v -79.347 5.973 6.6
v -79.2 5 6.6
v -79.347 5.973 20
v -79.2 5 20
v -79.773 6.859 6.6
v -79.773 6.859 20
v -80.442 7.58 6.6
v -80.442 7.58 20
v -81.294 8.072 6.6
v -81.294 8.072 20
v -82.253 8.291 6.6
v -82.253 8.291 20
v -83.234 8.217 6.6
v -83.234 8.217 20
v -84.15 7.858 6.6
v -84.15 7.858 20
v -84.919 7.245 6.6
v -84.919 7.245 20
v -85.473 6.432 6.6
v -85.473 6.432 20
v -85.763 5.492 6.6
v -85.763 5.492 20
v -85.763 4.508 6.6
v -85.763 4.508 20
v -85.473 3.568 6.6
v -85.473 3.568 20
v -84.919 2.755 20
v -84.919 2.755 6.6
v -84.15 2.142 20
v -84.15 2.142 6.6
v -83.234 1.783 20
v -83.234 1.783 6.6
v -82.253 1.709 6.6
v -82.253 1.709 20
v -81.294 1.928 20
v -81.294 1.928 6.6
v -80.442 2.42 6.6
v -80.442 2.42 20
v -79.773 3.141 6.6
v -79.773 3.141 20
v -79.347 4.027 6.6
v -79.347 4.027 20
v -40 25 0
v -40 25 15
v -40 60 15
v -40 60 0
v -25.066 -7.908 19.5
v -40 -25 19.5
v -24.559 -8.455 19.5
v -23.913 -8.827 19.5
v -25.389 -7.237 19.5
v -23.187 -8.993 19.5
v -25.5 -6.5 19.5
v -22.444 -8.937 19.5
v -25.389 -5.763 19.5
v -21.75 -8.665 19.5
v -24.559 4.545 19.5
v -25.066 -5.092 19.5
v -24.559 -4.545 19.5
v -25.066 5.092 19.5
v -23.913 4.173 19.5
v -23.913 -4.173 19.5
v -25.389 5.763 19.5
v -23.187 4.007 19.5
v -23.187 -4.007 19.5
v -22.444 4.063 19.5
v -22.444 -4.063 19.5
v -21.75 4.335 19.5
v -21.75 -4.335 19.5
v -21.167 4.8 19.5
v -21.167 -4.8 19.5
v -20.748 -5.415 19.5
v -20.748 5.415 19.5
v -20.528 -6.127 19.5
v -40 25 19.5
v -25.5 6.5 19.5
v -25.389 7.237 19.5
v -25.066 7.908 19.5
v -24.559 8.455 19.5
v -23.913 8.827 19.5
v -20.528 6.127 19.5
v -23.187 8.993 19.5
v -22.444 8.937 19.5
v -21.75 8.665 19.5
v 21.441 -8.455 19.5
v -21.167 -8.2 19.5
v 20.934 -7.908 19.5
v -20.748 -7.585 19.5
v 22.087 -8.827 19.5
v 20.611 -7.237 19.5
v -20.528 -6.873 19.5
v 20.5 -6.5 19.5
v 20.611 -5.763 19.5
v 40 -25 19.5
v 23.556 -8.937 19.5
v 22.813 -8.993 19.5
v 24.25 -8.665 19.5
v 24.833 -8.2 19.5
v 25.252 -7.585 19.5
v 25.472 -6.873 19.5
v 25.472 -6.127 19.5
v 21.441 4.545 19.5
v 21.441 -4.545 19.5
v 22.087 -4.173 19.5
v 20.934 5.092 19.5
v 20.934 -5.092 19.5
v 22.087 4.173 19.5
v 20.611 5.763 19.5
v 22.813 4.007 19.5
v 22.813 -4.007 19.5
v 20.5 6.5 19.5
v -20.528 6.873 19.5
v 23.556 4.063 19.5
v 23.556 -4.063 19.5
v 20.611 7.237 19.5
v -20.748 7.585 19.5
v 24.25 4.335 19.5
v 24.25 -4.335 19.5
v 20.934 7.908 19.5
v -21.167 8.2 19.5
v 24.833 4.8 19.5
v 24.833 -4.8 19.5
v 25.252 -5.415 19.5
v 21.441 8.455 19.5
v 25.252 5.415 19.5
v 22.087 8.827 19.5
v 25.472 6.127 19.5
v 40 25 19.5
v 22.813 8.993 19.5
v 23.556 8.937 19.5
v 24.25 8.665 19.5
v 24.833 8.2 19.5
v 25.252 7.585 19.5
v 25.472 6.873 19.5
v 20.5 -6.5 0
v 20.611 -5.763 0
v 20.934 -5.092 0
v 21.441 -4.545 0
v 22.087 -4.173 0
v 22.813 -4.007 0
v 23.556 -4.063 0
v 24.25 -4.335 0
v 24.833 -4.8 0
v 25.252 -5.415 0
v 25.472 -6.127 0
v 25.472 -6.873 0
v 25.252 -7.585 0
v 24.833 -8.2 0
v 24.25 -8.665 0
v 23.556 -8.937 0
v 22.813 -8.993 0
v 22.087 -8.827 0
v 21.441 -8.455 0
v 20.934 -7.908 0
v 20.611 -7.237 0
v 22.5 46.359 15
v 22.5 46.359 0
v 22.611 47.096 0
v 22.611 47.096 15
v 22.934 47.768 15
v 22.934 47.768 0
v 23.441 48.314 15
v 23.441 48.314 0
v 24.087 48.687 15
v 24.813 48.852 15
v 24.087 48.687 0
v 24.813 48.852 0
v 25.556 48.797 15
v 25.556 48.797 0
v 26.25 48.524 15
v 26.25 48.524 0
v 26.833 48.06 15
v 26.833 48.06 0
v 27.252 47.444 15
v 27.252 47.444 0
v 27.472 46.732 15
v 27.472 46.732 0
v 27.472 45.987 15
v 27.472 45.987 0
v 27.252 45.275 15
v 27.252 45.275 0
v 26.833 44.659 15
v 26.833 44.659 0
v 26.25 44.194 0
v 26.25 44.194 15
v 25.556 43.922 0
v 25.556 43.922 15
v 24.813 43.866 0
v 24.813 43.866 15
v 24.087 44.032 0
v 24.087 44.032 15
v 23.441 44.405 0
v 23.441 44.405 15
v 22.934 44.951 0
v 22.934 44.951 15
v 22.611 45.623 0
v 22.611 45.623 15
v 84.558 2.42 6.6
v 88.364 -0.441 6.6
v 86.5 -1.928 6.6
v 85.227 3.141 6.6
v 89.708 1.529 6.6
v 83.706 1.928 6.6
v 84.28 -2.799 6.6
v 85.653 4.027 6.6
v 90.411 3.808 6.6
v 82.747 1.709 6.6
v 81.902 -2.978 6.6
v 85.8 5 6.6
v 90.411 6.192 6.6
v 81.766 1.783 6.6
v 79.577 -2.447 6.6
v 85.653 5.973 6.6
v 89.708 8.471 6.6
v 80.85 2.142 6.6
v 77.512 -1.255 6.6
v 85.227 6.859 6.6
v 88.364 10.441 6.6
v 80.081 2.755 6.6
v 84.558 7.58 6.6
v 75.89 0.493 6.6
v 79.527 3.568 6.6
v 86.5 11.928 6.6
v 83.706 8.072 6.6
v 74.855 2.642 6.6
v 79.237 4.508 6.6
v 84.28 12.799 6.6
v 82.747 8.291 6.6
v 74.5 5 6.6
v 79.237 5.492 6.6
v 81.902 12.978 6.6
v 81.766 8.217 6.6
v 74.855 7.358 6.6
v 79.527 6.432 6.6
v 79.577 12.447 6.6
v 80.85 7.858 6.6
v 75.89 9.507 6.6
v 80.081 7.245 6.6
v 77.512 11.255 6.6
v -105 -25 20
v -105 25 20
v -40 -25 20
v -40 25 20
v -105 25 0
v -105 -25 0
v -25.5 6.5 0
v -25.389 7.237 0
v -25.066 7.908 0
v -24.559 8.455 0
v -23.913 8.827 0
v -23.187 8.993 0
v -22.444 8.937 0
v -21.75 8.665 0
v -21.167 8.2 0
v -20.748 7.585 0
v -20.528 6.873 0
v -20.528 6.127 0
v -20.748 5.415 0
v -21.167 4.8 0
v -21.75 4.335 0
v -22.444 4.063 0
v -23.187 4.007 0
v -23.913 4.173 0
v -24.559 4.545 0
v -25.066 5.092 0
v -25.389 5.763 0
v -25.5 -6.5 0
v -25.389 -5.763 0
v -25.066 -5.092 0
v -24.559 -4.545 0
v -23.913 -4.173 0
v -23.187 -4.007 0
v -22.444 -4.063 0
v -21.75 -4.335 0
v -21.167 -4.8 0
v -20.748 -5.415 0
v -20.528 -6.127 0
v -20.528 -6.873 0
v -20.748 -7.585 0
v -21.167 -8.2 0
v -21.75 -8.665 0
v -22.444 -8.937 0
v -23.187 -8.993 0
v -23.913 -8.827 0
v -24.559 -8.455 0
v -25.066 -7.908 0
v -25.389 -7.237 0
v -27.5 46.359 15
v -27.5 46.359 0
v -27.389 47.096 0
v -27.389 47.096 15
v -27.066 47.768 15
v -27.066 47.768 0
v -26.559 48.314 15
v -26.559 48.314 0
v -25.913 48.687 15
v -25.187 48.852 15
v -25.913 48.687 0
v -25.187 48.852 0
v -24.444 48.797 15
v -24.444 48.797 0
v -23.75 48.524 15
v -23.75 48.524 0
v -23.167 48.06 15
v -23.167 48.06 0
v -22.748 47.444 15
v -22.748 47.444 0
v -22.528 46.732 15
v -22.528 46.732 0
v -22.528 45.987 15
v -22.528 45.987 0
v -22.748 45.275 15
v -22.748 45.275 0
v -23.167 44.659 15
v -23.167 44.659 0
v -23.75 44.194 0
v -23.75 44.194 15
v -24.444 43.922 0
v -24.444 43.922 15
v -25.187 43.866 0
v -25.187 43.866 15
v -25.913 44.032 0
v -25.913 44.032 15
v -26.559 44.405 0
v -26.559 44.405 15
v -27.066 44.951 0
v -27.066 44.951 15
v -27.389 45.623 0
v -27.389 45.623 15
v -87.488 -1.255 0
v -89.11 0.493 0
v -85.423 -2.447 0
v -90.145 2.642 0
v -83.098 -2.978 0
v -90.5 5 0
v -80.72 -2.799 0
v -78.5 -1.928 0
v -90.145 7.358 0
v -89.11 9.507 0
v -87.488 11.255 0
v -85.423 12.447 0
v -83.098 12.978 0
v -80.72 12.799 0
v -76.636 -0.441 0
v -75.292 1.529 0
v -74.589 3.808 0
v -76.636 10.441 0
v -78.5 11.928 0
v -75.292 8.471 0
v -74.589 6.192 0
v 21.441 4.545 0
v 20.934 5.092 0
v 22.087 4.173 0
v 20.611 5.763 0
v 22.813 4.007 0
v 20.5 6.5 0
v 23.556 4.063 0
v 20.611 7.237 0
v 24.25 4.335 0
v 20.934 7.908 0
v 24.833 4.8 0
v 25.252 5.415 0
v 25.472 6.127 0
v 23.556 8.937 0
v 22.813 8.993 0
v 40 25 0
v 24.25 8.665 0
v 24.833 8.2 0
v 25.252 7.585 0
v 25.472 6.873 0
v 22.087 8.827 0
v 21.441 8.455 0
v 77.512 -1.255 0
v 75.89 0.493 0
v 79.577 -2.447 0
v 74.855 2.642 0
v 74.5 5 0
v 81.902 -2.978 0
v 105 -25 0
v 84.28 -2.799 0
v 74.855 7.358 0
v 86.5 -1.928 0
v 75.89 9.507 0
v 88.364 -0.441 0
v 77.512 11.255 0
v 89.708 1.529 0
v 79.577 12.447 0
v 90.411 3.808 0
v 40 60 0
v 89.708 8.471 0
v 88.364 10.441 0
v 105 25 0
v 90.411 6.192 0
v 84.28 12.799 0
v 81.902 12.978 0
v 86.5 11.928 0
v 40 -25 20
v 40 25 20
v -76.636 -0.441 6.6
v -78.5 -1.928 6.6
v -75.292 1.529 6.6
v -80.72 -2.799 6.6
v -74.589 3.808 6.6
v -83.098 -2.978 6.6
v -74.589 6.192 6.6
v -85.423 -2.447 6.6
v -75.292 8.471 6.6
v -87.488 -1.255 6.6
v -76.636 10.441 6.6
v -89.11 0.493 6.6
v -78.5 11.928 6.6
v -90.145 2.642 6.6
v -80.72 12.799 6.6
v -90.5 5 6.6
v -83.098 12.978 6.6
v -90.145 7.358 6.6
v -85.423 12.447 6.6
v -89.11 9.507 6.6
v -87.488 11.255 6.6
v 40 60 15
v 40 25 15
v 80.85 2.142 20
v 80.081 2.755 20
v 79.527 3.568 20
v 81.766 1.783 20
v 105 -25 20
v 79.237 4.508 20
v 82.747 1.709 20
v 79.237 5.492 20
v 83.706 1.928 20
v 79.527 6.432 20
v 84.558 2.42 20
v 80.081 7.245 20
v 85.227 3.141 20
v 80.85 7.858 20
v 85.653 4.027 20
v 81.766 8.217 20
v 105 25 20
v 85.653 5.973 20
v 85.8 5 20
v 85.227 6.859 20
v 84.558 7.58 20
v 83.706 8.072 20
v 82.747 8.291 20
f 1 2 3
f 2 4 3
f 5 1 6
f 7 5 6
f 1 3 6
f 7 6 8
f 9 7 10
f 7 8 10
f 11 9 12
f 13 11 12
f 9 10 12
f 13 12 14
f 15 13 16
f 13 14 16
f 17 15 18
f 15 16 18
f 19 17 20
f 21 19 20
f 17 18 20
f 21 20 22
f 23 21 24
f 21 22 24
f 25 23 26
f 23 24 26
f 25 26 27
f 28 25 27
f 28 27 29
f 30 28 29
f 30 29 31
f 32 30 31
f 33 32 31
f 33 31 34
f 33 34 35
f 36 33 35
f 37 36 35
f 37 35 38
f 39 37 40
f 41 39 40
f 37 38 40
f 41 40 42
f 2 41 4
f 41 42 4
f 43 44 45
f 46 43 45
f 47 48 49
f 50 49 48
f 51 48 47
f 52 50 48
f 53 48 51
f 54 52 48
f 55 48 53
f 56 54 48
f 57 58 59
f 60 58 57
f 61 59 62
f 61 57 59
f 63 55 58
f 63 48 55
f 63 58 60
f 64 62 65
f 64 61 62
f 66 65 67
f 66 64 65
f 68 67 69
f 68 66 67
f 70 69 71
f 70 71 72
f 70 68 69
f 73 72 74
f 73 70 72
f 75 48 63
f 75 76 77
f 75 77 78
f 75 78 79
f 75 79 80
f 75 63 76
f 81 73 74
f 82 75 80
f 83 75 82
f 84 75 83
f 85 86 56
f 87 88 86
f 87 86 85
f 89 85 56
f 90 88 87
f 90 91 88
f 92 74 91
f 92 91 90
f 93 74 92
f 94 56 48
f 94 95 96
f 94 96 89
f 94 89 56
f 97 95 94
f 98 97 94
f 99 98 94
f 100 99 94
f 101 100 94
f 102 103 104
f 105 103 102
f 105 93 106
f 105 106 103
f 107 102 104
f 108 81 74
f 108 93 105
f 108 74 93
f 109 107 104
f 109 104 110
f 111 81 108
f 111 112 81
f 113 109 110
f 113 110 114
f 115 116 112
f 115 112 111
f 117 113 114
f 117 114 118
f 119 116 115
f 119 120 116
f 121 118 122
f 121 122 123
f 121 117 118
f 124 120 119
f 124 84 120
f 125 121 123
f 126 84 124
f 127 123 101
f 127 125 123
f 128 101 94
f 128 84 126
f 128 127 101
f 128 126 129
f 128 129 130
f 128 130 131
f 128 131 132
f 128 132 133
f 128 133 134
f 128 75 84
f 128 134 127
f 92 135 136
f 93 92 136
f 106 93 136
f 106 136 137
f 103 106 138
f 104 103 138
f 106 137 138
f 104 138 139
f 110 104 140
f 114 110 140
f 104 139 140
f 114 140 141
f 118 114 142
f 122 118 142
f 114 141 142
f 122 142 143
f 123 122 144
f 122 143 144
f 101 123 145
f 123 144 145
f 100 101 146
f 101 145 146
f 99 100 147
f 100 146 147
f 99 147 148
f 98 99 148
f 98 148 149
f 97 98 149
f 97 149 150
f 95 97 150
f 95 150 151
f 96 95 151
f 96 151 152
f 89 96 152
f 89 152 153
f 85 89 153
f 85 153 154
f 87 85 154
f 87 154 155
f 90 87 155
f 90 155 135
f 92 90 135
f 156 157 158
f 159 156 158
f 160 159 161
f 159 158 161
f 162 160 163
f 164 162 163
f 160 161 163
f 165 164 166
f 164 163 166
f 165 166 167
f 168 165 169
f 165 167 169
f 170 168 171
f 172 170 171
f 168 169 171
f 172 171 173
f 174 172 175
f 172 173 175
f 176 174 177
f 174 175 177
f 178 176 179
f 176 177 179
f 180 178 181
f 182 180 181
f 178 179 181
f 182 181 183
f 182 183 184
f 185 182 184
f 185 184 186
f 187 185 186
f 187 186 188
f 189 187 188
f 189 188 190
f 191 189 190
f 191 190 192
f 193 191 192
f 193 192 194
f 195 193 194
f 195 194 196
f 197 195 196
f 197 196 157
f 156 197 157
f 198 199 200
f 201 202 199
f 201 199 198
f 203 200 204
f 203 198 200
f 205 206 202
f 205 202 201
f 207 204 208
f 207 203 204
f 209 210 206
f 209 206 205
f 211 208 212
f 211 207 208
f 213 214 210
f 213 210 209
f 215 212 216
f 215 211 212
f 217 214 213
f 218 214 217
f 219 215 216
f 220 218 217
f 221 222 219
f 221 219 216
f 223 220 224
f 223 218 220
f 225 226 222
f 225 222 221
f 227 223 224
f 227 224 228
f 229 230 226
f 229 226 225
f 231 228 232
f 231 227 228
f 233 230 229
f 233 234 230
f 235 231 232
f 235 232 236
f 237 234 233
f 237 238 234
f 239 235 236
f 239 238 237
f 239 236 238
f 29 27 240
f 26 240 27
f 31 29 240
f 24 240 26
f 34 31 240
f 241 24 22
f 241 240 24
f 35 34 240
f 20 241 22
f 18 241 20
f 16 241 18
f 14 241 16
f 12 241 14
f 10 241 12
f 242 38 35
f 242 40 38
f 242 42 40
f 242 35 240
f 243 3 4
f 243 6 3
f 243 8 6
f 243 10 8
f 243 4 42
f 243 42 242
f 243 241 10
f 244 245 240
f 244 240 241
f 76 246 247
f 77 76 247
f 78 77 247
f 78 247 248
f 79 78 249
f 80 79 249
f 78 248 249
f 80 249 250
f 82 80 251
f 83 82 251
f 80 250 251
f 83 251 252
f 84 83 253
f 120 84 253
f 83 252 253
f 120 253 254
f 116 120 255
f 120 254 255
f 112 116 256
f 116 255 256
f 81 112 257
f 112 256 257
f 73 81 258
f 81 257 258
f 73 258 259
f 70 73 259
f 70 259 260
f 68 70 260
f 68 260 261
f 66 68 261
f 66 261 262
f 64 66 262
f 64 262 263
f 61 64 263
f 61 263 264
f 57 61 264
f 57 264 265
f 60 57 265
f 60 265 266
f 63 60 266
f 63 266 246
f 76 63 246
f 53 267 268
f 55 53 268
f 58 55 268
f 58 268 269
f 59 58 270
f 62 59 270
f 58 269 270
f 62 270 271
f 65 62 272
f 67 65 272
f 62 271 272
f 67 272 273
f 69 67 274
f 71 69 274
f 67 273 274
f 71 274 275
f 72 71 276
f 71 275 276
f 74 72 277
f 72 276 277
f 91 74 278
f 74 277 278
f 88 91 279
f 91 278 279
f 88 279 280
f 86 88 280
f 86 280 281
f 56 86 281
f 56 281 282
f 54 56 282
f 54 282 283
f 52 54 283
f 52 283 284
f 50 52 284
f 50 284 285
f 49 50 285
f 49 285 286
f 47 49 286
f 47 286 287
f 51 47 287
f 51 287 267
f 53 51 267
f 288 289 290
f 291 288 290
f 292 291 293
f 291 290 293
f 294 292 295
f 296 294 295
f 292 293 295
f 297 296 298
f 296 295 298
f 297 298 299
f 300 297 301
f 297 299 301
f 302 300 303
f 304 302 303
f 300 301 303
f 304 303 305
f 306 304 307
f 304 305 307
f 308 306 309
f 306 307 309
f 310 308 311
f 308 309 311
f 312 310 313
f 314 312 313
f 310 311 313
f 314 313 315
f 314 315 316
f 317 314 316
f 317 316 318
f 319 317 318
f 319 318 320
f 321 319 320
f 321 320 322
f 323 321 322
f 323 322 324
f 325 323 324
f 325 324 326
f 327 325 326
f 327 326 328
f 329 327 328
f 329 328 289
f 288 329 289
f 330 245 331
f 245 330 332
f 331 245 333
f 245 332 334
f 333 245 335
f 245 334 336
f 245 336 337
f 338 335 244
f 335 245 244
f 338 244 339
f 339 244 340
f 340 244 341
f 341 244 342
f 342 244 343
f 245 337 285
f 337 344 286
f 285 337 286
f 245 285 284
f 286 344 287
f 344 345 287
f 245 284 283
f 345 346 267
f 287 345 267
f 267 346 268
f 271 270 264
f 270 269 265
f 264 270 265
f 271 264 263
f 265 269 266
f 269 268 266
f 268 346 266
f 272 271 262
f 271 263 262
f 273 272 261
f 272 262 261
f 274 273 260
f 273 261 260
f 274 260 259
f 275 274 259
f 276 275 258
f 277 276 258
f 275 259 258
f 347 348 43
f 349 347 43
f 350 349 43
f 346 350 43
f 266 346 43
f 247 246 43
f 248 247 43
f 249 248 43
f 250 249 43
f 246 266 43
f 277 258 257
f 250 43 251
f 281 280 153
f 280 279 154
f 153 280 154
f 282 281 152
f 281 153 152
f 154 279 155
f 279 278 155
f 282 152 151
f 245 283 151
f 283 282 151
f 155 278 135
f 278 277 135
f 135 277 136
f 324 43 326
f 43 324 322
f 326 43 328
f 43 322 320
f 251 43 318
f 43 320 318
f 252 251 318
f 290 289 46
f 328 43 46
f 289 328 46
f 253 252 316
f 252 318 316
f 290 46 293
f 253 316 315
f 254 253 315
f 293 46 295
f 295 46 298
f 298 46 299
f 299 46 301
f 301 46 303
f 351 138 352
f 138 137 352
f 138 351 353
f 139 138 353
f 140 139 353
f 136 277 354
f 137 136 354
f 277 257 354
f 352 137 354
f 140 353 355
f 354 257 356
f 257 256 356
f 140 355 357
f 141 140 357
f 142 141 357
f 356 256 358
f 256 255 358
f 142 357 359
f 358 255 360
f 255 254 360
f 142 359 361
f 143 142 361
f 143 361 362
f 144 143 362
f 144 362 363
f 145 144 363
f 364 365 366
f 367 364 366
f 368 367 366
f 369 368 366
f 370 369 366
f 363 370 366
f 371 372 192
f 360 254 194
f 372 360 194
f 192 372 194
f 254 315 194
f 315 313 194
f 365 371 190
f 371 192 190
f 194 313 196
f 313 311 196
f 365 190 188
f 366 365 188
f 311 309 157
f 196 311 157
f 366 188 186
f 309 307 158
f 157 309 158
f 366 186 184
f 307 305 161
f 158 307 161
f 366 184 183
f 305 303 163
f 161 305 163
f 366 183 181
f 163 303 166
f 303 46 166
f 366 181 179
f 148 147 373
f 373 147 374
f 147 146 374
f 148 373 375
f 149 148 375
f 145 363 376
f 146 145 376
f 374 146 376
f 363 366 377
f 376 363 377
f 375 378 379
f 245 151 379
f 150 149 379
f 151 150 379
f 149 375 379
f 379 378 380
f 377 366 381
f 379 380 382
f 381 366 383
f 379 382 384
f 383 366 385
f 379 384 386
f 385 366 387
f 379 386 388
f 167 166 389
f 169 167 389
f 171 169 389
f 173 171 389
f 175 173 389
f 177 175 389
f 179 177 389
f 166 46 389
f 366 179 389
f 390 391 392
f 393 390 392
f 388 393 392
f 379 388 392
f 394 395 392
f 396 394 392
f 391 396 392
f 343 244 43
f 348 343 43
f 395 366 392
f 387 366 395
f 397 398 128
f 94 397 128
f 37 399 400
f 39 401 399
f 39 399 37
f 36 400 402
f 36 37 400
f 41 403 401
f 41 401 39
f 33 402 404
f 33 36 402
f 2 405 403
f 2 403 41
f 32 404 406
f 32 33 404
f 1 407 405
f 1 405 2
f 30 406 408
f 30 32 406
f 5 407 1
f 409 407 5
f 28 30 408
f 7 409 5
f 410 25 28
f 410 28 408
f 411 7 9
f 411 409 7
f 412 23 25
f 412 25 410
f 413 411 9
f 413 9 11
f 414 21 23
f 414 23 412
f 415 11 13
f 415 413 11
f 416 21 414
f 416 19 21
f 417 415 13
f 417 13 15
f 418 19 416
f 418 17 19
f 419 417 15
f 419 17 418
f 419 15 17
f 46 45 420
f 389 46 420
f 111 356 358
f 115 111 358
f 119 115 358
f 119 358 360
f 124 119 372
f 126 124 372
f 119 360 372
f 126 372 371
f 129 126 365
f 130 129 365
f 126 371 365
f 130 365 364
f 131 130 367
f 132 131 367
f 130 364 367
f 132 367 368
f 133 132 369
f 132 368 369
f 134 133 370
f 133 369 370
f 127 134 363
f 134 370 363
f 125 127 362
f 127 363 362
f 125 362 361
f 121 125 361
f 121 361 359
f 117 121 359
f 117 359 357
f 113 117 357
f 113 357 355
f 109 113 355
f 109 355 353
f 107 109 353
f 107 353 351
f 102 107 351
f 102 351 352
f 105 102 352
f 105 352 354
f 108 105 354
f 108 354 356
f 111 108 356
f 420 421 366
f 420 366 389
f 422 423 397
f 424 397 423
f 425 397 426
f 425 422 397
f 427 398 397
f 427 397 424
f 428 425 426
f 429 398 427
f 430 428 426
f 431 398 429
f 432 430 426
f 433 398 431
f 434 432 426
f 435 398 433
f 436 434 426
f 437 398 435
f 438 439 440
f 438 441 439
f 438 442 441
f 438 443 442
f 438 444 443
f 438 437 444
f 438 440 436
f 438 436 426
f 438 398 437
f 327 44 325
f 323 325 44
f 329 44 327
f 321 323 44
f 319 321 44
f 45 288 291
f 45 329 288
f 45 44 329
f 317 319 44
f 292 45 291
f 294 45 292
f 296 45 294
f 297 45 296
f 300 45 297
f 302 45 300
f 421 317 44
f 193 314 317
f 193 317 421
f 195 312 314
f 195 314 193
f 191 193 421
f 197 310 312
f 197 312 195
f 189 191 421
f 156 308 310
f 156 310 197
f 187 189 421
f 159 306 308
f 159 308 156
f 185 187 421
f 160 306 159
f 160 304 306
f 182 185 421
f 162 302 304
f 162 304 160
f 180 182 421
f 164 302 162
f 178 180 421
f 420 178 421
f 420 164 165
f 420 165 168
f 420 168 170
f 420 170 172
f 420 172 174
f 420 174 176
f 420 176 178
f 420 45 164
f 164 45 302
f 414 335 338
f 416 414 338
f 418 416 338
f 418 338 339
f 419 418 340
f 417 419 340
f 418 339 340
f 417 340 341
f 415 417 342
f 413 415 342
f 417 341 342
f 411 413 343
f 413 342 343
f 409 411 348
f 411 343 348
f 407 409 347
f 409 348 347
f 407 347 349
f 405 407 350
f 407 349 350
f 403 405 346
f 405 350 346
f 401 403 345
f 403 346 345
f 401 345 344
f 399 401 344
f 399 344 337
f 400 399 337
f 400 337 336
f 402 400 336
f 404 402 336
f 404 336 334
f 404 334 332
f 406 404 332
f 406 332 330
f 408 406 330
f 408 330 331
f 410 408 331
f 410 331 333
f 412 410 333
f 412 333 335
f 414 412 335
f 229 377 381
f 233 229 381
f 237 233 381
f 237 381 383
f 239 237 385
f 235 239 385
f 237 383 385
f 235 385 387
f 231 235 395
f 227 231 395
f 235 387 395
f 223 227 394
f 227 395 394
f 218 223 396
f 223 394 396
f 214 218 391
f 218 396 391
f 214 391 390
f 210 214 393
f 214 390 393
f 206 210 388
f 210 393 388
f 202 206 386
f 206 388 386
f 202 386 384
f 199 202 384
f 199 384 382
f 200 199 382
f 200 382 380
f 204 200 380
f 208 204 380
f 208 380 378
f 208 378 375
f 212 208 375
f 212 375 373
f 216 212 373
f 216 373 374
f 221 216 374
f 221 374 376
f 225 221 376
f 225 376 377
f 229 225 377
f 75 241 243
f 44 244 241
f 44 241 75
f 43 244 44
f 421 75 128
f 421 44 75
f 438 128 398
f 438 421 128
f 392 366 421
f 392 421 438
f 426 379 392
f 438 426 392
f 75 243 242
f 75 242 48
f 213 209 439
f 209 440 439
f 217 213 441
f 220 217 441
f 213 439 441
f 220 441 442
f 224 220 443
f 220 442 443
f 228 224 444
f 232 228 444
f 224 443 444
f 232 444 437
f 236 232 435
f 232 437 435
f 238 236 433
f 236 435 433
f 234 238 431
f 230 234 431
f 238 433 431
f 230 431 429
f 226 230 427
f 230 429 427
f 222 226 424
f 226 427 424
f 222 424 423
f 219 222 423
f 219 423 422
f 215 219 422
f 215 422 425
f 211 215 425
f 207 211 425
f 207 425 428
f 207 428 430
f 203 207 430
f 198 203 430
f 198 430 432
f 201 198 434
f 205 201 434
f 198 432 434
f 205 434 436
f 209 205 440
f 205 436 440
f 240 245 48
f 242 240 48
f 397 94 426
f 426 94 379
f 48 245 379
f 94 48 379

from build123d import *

# Parameters (mm, degrees)
SKETCH1_W                                      = 210
SKETCH1_H                                      = 50
EXTRUDE1_DEPTH                                 = 20
CBORE_FOR_M6_HEX_HEAD_FLANGE_BOLT1_D           = 6.6
CBORE_FOR_M6_HEX_HEAD_FLANGE_BOLT1_CBORE_D     = 16
CBORE_FOR_M6_HEX_HEAD_FLANGE_BOLT1_CBORE_DEPTH = 6.6
CUT_EXTRUDE1_REACH                             = 52
SKETCH4_W                                      = 80
SKETCH4_H                                      = 0.5
M6_TAPPED_HOLE1_D                              = 5
SKETCH7_W                                      = 80
SKETCH7_H                                      = 35
EXTRUDE2_DEPTH                                 = 19.5
SKETCH8_W                                      = 80
SKETCH8_H                                      = 5
CUT_EXTRUDE2_DEPTH                             = 35
M6_TAPPED_HOLE2_D                              = 5


with BuildPart() as part:
    # Sketch1 → Extrude1 (new body)
    with BuildSketch(Plane.XY):
        Rectangle(SKETCH1_W, SKETCH1_H)
    extrude(amount=EXTRUDE1_DEPTH)

    # CBORE for M6 Hex Head Flange Bolt1 (through all)
    with Locations(Plane(origin=(0, 0, 0), x_dir=(-1, 0, 0), z_dir=(0, 0, -1))):
        with Locations((82.5, 5), (-82.5, 5)):
            CounterBoreHole(CBORE_FOR_M6_HEX_HEAD_FLANGE_BOLT1_D / 2, CBORE_FOR_M6_HEX_HEAD_FLANGE_BOLT1_CBORE_D / 2, CBORE_FOR_M6_HEX_HEAD_FLANGE_BOLT1_CBORE_DEPTH)

    # Sketch4 → Cut-Extrude1 (cut, up to next)
    with BuildSketch(Plane(origin=(0, 25, 0), x_dir=(1, 0, 0), z_dir=(0, 1, 0)), mode=Mode.PRIVATE) as cut_extrude1_sk1:
        with Locations((0, -19.75)):
            Rectangle(SKETCH4_W, SKETCH4_H)
    cut_extrude1_tool1 = extrude(cut_extrude1_sk1.sketch, amount=-CUT_EXTRUDE1_REACH, mode=Mode.PRIVATE) & part.part
    add(cut_extrude1_tool1.solids().sort_by_distance((0, 25, 19.75))[0], mode=Mode.SUBTRACT)

    # M6 Tapped Hole1 (through all)
    with Locations(Plane.XY.offset(19.5)):
        with Locations((-23, 6.5), (-23, -6.5), (23, 6.5), (23, -6.5)):
            Hole(M6_TAPPED_HOLE1_D / 2)

    # Sketch7 → Extrude2 (add)
    with BuildSketch(Plane.XY.offset(19.5)):
        with Locations((0, 42.5)):
            Rectangle(SKETCH7_W, SKETCH7_H)
    extrude(amount=-EXTRUDE2_DEPTH)

    # Sketch8 → Cut-Extrude2 (cut)
    with BuildSketch(Plane(origin=(0, 60, 0), x_dir=(1, 0, 0), z_dir=(0, 1, 0))):
        with Locations((0, -17.5)):
            Rectangle(SKETCH8_W, SKETCH8_H)
    extrude(amount=-CUT_EXTRUDE2_DEPTH, mode=Mode.SUBTRACT)

    # M6 Tapped Hole2 (through all)
    with Locations(Plane.XY.offset(15)):
        with Locations((-25, 46.359410027), (25, 46.359410027)):
            Hole(M6_TAPPED_HOLE2_D / 2)


solid = part.part
